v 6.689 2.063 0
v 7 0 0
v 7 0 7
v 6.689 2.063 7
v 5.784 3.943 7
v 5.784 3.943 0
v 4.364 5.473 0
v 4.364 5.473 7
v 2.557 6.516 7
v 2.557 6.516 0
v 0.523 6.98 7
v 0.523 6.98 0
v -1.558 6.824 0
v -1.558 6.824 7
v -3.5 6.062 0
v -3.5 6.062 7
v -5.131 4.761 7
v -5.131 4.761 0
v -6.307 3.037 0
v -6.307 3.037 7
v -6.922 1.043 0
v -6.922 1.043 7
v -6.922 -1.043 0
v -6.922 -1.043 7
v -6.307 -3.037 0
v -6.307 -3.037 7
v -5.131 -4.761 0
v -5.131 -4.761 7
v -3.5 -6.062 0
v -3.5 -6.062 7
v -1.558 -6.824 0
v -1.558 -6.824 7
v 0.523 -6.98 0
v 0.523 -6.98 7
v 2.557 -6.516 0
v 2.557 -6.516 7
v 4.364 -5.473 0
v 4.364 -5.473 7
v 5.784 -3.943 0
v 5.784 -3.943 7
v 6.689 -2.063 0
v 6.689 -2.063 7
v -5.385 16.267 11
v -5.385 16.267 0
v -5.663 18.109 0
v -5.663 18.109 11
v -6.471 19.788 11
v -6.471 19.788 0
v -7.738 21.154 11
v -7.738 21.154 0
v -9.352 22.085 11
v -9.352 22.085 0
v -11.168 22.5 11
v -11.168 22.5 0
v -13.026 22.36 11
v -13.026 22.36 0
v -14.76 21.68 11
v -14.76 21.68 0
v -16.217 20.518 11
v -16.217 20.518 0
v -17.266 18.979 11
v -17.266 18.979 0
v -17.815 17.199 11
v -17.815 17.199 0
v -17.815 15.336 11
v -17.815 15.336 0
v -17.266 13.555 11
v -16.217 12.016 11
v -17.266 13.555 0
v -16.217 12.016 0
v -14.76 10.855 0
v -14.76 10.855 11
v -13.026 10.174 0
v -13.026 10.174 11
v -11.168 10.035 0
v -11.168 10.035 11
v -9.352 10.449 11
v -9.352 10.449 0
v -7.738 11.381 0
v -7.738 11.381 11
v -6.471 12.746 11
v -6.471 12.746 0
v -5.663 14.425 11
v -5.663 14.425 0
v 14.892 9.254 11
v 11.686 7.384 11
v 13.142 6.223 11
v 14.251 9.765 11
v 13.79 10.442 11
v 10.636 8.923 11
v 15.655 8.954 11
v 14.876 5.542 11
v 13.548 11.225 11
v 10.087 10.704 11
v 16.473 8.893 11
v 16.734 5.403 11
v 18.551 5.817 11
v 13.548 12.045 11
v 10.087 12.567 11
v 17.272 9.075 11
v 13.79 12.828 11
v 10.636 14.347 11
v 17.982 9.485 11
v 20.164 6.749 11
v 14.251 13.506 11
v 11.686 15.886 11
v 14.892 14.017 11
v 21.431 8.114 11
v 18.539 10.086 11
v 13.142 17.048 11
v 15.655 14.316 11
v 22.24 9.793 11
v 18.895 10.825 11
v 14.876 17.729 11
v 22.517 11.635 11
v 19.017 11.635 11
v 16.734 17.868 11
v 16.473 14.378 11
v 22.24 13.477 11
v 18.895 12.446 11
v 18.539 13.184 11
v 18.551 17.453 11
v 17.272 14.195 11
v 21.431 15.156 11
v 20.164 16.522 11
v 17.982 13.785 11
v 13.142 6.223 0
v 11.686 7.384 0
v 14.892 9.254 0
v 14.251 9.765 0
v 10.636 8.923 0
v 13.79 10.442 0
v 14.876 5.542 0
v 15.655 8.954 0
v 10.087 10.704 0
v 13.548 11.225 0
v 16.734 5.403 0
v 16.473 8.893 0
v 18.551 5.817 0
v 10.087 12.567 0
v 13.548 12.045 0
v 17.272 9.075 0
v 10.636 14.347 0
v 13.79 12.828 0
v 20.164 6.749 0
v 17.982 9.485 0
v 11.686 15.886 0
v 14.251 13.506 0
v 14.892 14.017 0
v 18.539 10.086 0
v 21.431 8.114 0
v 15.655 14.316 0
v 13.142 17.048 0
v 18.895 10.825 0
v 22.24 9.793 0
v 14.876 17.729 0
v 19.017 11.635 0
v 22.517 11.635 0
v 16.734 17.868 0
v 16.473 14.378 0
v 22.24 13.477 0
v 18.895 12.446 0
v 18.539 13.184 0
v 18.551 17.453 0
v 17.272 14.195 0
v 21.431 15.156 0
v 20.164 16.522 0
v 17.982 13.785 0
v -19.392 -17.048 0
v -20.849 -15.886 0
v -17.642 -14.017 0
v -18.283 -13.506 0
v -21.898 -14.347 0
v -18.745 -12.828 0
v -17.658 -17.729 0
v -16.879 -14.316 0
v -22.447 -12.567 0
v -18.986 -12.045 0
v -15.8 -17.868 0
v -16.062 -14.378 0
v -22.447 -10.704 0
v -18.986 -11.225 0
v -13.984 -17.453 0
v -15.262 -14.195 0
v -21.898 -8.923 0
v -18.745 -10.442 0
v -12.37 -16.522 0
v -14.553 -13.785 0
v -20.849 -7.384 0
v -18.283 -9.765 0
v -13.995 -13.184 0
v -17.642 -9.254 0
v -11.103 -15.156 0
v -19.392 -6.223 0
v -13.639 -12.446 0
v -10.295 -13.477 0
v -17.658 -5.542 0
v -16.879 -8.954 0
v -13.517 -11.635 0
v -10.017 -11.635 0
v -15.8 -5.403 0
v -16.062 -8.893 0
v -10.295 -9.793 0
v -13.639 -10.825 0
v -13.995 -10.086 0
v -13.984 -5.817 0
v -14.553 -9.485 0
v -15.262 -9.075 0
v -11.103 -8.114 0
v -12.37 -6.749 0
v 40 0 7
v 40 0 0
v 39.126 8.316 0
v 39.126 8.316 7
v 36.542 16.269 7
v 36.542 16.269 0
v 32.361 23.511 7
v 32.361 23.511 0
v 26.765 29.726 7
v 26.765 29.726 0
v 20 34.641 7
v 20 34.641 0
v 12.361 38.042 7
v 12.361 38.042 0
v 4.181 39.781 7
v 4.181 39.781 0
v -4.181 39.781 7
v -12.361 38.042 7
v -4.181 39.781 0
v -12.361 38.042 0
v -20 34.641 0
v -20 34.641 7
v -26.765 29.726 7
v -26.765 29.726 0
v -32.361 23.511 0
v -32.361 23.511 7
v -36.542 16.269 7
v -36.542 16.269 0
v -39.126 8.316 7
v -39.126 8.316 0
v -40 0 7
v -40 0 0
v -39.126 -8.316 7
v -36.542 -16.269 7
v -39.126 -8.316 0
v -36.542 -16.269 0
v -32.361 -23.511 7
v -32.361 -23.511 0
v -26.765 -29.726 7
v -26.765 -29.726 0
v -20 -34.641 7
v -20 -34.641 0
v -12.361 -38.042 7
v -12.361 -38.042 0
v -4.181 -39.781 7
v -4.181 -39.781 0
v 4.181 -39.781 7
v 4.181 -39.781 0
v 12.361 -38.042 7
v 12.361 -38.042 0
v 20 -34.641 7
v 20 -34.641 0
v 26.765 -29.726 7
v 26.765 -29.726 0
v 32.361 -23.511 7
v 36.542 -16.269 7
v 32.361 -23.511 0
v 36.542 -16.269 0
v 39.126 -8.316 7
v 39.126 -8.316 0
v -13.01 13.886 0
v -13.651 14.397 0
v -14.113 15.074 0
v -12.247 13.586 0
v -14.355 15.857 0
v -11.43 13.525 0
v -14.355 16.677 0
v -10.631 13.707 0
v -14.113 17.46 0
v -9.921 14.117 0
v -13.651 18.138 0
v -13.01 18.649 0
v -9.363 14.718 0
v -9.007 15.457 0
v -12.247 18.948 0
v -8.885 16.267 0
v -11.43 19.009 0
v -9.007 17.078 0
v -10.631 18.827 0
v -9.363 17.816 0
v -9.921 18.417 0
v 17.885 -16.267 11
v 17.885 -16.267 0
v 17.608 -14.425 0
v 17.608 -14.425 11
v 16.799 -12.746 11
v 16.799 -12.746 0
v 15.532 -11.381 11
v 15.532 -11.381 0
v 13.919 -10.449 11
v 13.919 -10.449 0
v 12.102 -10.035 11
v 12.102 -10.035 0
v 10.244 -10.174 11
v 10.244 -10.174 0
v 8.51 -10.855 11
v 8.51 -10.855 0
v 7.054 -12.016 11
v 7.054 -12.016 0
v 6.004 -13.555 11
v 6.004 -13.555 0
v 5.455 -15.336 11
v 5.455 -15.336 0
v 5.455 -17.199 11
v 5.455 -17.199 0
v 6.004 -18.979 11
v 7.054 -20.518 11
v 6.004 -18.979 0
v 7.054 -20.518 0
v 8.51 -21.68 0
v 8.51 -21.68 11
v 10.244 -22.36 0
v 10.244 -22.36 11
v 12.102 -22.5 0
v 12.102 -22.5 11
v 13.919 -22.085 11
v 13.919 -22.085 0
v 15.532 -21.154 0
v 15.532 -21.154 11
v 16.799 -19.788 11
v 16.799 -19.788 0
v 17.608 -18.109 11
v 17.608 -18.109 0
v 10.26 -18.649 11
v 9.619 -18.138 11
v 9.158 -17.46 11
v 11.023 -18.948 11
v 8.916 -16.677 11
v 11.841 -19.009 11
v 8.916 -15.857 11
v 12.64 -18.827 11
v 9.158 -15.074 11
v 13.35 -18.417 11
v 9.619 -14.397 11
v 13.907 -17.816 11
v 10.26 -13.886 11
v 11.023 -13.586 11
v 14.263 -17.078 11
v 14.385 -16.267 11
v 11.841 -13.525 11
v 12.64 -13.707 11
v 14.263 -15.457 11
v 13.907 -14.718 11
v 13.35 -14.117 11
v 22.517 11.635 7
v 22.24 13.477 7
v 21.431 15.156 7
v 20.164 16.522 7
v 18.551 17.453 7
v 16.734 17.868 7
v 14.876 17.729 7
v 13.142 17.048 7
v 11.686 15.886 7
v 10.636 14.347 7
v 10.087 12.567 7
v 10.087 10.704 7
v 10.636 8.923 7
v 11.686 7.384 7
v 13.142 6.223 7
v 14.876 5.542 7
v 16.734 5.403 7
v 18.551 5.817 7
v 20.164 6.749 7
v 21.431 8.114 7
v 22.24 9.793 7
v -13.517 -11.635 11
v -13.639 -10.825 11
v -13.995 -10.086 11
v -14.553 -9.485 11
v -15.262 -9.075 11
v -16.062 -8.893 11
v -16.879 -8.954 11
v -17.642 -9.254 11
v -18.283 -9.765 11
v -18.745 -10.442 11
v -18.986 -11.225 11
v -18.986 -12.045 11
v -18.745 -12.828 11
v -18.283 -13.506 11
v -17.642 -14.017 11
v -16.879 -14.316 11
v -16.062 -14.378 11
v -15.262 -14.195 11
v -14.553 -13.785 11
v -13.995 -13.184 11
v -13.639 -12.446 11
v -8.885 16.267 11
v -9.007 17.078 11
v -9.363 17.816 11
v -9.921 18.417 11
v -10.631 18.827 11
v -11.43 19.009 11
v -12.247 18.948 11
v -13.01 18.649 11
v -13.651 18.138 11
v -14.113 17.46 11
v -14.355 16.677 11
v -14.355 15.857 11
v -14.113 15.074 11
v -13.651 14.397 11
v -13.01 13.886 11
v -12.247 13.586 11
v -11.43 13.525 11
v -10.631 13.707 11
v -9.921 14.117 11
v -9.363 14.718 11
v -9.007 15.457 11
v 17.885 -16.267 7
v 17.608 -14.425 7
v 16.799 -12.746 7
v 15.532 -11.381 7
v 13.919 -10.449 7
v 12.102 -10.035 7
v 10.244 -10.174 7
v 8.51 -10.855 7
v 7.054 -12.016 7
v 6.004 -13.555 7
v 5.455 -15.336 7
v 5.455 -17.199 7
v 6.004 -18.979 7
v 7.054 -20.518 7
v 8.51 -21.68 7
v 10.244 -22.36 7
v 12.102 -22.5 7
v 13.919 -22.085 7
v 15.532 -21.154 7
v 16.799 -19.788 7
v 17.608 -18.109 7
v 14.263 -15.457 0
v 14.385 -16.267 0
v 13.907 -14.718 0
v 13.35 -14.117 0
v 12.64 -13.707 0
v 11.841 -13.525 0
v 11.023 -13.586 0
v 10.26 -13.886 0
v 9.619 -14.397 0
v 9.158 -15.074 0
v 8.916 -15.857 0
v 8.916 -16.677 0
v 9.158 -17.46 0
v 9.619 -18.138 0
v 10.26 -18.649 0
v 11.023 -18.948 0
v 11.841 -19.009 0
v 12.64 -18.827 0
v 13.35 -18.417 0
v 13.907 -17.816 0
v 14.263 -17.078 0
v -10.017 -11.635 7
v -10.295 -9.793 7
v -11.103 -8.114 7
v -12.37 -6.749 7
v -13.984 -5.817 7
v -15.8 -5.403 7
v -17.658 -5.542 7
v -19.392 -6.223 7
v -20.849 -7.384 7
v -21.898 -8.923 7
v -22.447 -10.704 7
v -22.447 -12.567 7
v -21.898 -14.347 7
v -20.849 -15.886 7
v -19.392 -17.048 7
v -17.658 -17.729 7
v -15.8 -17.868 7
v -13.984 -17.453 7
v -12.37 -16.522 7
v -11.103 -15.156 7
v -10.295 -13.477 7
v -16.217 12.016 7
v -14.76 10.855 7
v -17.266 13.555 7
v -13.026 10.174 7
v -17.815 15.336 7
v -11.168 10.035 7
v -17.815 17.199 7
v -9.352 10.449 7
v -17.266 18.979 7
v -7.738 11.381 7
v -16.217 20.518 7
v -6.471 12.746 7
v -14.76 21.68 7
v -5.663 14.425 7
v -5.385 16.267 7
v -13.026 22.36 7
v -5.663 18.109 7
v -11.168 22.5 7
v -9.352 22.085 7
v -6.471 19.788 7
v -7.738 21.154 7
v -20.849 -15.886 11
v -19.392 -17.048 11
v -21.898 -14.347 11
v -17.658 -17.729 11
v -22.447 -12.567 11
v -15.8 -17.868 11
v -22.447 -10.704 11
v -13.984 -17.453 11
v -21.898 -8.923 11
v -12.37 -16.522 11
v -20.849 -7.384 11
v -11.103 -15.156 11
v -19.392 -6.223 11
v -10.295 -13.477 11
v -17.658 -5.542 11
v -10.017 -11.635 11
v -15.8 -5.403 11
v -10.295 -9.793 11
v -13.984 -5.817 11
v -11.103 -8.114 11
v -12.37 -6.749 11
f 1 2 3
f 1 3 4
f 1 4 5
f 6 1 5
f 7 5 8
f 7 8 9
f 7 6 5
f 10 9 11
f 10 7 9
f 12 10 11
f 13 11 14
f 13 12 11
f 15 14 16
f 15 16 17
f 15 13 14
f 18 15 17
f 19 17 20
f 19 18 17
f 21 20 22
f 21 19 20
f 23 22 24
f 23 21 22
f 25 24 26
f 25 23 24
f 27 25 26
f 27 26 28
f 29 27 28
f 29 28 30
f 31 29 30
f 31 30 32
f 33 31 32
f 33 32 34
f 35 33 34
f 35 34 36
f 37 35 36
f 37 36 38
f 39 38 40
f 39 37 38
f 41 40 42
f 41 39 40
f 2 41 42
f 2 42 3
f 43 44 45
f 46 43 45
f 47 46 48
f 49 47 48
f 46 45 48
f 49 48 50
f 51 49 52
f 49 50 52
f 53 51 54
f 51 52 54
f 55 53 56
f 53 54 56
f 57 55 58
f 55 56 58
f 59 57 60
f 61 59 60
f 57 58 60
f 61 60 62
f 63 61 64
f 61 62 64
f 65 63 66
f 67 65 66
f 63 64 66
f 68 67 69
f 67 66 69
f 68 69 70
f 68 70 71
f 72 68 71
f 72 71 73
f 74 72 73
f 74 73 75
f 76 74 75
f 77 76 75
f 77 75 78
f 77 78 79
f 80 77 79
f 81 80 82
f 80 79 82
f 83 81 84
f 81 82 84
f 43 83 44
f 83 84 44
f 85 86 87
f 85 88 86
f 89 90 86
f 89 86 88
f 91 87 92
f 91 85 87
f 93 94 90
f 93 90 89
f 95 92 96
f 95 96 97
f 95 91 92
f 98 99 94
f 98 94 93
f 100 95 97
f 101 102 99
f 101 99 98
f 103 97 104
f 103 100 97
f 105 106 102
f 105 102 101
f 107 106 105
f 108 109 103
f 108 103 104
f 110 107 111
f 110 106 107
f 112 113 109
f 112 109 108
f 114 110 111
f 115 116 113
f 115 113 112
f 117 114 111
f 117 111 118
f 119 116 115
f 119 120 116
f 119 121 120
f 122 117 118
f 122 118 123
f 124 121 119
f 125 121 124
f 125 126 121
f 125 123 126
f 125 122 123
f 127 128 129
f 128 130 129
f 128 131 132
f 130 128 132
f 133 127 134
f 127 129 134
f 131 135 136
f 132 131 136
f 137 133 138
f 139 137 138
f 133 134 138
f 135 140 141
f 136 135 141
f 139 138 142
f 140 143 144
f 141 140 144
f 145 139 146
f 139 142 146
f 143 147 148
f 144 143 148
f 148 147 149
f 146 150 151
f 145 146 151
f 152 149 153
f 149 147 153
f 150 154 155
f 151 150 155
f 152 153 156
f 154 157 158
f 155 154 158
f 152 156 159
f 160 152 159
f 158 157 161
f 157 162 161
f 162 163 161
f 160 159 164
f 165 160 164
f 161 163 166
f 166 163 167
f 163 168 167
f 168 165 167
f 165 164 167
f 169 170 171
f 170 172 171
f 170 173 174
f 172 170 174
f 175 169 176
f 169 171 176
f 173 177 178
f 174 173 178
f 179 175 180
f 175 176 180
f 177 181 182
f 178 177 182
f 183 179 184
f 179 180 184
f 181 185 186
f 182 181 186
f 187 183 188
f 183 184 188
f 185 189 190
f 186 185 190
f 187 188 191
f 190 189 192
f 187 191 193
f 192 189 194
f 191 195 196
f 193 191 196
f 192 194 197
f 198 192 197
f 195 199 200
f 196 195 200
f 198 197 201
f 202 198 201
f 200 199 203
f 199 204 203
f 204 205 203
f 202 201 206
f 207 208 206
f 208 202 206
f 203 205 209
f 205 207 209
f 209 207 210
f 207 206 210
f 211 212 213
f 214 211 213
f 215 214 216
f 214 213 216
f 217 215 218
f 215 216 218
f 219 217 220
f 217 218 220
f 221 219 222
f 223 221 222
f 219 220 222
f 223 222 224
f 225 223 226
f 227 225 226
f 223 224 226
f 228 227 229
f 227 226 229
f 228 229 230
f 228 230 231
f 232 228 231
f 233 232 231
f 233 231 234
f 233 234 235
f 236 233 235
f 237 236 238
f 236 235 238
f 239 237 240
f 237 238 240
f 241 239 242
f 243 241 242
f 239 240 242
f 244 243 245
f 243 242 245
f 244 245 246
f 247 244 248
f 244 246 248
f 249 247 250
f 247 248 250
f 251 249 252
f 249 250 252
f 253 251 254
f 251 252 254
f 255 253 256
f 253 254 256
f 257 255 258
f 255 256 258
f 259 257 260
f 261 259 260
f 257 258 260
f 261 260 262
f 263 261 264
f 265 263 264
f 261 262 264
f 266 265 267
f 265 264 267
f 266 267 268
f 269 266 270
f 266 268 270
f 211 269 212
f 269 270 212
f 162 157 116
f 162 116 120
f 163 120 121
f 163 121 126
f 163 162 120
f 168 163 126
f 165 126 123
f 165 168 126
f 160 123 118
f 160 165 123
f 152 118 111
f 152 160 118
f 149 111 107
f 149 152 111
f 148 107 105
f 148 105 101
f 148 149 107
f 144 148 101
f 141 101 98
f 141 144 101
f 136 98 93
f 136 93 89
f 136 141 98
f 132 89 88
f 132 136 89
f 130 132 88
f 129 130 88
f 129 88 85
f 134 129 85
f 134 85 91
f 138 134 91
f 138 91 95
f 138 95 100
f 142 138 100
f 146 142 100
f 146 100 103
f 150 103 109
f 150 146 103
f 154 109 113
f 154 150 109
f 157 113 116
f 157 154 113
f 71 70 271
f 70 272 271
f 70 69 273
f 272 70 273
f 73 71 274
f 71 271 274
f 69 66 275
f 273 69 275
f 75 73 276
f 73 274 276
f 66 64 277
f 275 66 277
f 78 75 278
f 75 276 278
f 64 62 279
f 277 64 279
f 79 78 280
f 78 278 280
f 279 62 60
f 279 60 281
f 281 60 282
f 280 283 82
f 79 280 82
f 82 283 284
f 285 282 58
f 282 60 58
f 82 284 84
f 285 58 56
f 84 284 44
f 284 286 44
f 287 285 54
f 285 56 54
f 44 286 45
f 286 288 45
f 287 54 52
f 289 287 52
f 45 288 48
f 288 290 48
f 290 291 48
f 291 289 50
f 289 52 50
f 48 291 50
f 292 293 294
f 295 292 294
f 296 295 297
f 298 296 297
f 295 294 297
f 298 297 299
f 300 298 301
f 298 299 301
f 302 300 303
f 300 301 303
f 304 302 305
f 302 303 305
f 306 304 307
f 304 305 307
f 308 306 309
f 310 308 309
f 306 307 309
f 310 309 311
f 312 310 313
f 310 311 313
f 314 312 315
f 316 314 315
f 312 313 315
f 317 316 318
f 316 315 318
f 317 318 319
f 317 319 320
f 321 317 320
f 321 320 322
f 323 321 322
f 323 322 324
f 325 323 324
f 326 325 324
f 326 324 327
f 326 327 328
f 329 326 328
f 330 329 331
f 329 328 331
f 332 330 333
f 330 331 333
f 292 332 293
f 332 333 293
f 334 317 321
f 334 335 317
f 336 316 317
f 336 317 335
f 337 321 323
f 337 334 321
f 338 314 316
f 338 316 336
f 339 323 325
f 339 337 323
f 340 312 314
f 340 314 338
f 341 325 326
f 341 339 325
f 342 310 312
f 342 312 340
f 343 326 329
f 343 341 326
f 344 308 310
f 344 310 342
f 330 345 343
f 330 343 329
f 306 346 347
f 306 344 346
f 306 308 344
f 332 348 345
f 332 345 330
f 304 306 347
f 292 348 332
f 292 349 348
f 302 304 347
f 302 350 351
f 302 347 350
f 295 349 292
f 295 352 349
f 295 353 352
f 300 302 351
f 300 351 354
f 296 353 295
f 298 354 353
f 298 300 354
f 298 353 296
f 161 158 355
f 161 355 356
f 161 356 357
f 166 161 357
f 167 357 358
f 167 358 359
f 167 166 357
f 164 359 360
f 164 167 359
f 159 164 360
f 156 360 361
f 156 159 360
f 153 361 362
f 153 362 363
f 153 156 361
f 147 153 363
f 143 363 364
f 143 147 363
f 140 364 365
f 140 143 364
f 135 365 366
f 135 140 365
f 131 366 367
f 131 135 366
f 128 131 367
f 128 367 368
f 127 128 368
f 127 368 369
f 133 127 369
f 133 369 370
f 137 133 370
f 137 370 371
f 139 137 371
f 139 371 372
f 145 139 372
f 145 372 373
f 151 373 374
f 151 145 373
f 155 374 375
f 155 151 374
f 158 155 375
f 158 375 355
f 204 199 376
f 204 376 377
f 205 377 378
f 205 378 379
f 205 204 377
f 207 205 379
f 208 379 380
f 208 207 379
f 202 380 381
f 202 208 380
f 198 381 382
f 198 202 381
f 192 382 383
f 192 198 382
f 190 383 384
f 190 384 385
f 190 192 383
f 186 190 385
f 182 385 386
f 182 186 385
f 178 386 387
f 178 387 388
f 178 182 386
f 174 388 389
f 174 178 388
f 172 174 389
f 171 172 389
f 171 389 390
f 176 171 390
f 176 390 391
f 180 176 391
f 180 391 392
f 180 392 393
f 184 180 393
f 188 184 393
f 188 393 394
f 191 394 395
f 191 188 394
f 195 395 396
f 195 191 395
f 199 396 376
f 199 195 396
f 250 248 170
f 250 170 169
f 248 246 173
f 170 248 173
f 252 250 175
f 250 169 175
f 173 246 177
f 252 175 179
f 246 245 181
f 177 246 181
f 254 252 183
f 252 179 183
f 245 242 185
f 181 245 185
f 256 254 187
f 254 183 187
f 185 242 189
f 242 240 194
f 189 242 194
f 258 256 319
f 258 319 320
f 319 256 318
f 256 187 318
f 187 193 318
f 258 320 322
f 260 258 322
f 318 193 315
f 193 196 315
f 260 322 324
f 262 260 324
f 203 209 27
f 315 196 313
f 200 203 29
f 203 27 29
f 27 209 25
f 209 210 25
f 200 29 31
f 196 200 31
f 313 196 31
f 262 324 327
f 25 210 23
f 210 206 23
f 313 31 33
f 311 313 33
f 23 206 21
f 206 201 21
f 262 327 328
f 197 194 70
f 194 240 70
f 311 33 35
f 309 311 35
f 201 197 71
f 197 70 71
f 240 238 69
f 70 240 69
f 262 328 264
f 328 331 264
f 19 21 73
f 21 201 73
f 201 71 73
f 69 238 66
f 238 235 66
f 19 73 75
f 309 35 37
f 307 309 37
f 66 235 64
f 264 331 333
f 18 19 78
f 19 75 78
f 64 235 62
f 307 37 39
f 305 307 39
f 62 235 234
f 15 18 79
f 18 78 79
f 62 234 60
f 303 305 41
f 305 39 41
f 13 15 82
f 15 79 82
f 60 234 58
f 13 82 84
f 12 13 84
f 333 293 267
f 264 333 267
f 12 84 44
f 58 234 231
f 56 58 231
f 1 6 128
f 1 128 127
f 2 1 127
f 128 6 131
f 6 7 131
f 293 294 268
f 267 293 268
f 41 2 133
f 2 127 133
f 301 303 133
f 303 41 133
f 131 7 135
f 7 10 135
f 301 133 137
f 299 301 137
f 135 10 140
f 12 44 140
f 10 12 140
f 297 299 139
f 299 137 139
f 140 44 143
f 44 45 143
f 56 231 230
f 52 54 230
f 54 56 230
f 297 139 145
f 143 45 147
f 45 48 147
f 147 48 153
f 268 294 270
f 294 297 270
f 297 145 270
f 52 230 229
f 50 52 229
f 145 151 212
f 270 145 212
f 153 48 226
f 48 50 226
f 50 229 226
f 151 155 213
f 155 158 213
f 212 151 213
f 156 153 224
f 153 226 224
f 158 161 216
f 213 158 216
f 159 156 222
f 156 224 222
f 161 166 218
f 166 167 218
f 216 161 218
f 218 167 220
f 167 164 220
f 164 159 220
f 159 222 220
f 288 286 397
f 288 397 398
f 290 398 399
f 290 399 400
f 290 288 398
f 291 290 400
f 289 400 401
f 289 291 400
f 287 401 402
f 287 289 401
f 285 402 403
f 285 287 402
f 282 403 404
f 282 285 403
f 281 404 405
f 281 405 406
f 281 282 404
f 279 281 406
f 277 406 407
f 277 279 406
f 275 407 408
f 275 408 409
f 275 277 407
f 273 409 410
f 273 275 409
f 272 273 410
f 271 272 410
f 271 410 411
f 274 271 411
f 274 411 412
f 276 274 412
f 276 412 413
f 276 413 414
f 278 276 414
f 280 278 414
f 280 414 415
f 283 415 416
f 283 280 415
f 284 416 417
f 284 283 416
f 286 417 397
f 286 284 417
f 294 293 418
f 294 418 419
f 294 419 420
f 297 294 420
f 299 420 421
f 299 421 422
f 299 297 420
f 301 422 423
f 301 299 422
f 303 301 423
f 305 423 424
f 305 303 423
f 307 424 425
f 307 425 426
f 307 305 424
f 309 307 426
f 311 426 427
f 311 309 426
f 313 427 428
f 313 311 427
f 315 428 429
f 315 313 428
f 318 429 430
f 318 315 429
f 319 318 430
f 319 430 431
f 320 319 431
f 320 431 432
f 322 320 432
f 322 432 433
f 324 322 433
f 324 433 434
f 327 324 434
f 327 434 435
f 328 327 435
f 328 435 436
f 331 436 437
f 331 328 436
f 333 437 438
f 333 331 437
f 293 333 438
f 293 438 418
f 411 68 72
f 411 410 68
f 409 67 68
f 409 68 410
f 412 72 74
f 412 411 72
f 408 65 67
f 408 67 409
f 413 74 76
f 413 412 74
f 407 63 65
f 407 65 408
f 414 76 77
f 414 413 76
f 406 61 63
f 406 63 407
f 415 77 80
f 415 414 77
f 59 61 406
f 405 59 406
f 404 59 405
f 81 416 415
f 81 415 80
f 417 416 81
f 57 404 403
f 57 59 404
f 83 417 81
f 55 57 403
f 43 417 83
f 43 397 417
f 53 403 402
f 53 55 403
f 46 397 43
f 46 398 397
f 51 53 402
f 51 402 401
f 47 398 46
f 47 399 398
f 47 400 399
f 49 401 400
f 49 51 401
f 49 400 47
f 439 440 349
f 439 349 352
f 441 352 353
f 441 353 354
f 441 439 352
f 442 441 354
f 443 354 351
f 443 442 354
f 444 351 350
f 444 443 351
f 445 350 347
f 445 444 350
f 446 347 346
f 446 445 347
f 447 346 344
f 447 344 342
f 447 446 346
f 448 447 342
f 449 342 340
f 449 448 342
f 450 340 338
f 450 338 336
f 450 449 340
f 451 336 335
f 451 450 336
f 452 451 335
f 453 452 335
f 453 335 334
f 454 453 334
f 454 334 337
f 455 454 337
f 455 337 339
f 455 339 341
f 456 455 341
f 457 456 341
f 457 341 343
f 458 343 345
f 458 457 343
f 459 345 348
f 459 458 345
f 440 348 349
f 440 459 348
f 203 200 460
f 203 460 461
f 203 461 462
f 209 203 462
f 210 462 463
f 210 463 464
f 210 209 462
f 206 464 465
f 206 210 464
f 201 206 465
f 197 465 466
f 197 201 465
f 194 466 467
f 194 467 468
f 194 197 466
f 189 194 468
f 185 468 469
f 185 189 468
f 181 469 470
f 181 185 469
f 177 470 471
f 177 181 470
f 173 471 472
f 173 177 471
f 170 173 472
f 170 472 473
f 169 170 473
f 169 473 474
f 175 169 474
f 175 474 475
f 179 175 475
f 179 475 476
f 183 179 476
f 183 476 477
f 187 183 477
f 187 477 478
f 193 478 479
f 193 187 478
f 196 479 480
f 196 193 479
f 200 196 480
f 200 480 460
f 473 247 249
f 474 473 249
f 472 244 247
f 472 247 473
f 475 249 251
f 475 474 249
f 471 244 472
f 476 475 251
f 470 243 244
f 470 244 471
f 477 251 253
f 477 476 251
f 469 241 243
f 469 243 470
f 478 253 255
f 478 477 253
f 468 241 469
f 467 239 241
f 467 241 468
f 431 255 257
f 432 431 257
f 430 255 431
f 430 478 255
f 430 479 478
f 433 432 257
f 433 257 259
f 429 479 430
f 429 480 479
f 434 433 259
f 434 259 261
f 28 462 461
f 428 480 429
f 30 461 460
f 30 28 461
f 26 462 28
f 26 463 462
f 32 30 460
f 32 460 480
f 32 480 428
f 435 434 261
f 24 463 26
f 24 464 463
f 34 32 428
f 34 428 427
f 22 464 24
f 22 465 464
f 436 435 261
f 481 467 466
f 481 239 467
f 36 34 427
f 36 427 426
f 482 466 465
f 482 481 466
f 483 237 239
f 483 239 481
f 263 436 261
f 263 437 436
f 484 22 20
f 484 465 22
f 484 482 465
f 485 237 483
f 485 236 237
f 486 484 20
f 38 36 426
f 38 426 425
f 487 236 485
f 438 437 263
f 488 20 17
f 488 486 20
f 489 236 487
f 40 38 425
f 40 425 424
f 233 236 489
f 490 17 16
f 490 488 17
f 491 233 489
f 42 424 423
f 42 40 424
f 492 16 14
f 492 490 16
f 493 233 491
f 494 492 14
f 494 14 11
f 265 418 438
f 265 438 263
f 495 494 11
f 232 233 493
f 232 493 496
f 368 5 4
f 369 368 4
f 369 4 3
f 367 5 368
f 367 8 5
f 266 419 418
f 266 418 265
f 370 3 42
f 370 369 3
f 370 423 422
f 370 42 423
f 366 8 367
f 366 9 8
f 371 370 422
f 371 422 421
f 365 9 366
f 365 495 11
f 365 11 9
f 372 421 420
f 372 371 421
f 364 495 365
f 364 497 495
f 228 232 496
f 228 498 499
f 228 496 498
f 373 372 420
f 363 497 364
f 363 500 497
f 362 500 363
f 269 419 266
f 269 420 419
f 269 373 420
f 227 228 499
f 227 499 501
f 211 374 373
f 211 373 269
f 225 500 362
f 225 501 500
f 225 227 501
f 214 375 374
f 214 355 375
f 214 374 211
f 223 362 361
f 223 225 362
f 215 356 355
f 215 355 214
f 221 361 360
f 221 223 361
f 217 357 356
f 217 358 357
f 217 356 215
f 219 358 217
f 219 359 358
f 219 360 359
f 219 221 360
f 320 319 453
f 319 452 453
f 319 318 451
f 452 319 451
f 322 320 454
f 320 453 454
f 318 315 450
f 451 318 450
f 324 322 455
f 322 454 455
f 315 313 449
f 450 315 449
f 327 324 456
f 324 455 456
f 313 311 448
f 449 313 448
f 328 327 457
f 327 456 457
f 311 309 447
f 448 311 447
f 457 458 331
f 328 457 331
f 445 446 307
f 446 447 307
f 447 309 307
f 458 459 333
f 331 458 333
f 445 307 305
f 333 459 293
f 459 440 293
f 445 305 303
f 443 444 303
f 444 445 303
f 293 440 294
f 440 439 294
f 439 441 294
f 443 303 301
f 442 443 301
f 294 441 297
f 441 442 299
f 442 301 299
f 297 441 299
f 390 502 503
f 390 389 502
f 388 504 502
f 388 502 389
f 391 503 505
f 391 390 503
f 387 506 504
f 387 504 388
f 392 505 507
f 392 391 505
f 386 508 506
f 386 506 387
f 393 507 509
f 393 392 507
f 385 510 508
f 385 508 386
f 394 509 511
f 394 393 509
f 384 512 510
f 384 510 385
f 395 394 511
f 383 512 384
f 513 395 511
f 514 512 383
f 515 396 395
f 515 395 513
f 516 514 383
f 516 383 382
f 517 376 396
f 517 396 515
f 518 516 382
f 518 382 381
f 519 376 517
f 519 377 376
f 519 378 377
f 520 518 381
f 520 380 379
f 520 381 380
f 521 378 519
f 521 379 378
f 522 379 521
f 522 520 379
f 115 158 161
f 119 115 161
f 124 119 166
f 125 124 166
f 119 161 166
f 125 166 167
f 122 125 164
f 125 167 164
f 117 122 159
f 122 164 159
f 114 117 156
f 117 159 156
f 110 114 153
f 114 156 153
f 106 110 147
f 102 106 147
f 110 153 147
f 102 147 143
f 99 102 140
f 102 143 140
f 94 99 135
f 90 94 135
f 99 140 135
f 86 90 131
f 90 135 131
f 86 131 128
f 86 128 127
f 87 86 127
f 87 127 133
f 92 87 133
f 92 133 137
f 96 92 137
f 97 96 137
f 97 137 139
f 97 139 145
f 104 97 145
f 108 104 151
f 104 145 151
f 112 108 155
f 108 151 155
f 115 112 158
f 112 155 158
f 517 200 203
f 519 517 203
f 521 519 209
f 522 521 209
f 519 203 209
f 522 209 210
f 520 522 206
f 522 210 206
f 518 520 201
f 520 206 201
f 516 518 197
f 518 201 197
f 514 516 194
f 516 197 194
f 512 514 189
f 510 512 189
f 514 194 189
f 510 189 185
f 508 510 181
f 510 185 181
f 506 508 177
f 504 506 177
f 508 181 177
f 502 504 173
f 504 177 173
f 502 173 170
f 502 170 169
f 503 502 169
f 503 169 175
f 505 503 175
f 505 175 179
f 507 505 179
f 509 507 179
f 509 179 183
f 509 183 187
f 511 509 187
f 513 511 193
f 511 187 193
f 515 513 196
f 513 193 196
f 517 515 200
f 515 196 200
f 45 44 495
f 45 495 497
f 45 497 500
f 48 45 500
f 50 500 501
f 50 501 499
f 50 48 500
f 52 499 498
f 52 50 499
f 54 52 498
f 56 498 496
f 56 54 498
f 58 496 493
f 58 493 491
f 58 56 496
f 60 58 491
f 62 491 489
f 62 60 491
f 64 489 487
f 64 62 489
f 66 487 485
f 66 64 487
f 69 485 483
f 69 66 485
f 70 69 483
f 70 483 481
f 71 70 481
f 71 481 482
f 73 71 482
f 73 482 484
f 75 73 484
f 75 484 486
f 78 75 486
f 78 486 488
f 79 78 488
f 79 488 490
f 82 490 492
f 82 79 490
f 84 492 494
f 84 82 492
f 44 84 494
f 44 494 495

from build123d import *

# Parameters (mm, degrees)
F0_R     = 40
F0_R_2   = 6.25
F0_R_3   = 7
F1_DEPTH = 7
F0_R_4   = 2.75
F2_DEPTH = 11


with BuildPart() as f1:
    # F0 (on Top) → F1 (new body)
    with BuildSketch(Plane.XY):
        Circle(F0_R)
        with Locations((-16.267187, -11.635232)):
            Circle(F0_R_2, mode=Mode.SUBTRACT)
        with Locations((11.635232, -16.267187)):
            Circle(F0_R_2, mode=Mode.SUBTRACT)
        with Locations((-11.635232, 16.267187)):
            Circle(F0_R_2, mode=Mode.SUBTRACT)
        Circle(F0_R_3, mode=Mode.SUBTRACT)
        with Locations((16.267187, 11.635232)):
            Circle(F0_R_2, mode=Mode.SUBTRACT)
    extrude(amount=F1_DEPTH)


with BuildPart() as f2:
    # F0 (on Top) → F2 (new body)
    with BuildSketch(Plane.XY):
        with Locations((-11.635232, 16.267187)):
            Circle(F0_R_2)
        with Locations((-11.635232, 16.267187)):
            Circle(F0_R_4, mode=Mode.SUBTRACT)
        with Locations((-16.267187, -11.635232)):
            Circle(F0_R_2)
        with Locations((-16.267187, -11.635232)):
            Circle(F0_R_4, mode=Mode.SUBTRACT)
        with Locations((11.635232, -16.267187)):
            Circle(F0_R_2)
        with Locations((11.635232, -16.267187)):
            Circle(F0_R_4, mode=Mode.SUBTRACT)
        with Locations((16.267187, 11.635232)):
            Circle(F0_R_2)
        with Locations((16.267187, 11.635232)):
            Circle(F0_R_4, mode=Mode.SUBTRACT)
    extrude(amount=F2_DEPTH)


solid = Compound([f1.part, f2.part])
